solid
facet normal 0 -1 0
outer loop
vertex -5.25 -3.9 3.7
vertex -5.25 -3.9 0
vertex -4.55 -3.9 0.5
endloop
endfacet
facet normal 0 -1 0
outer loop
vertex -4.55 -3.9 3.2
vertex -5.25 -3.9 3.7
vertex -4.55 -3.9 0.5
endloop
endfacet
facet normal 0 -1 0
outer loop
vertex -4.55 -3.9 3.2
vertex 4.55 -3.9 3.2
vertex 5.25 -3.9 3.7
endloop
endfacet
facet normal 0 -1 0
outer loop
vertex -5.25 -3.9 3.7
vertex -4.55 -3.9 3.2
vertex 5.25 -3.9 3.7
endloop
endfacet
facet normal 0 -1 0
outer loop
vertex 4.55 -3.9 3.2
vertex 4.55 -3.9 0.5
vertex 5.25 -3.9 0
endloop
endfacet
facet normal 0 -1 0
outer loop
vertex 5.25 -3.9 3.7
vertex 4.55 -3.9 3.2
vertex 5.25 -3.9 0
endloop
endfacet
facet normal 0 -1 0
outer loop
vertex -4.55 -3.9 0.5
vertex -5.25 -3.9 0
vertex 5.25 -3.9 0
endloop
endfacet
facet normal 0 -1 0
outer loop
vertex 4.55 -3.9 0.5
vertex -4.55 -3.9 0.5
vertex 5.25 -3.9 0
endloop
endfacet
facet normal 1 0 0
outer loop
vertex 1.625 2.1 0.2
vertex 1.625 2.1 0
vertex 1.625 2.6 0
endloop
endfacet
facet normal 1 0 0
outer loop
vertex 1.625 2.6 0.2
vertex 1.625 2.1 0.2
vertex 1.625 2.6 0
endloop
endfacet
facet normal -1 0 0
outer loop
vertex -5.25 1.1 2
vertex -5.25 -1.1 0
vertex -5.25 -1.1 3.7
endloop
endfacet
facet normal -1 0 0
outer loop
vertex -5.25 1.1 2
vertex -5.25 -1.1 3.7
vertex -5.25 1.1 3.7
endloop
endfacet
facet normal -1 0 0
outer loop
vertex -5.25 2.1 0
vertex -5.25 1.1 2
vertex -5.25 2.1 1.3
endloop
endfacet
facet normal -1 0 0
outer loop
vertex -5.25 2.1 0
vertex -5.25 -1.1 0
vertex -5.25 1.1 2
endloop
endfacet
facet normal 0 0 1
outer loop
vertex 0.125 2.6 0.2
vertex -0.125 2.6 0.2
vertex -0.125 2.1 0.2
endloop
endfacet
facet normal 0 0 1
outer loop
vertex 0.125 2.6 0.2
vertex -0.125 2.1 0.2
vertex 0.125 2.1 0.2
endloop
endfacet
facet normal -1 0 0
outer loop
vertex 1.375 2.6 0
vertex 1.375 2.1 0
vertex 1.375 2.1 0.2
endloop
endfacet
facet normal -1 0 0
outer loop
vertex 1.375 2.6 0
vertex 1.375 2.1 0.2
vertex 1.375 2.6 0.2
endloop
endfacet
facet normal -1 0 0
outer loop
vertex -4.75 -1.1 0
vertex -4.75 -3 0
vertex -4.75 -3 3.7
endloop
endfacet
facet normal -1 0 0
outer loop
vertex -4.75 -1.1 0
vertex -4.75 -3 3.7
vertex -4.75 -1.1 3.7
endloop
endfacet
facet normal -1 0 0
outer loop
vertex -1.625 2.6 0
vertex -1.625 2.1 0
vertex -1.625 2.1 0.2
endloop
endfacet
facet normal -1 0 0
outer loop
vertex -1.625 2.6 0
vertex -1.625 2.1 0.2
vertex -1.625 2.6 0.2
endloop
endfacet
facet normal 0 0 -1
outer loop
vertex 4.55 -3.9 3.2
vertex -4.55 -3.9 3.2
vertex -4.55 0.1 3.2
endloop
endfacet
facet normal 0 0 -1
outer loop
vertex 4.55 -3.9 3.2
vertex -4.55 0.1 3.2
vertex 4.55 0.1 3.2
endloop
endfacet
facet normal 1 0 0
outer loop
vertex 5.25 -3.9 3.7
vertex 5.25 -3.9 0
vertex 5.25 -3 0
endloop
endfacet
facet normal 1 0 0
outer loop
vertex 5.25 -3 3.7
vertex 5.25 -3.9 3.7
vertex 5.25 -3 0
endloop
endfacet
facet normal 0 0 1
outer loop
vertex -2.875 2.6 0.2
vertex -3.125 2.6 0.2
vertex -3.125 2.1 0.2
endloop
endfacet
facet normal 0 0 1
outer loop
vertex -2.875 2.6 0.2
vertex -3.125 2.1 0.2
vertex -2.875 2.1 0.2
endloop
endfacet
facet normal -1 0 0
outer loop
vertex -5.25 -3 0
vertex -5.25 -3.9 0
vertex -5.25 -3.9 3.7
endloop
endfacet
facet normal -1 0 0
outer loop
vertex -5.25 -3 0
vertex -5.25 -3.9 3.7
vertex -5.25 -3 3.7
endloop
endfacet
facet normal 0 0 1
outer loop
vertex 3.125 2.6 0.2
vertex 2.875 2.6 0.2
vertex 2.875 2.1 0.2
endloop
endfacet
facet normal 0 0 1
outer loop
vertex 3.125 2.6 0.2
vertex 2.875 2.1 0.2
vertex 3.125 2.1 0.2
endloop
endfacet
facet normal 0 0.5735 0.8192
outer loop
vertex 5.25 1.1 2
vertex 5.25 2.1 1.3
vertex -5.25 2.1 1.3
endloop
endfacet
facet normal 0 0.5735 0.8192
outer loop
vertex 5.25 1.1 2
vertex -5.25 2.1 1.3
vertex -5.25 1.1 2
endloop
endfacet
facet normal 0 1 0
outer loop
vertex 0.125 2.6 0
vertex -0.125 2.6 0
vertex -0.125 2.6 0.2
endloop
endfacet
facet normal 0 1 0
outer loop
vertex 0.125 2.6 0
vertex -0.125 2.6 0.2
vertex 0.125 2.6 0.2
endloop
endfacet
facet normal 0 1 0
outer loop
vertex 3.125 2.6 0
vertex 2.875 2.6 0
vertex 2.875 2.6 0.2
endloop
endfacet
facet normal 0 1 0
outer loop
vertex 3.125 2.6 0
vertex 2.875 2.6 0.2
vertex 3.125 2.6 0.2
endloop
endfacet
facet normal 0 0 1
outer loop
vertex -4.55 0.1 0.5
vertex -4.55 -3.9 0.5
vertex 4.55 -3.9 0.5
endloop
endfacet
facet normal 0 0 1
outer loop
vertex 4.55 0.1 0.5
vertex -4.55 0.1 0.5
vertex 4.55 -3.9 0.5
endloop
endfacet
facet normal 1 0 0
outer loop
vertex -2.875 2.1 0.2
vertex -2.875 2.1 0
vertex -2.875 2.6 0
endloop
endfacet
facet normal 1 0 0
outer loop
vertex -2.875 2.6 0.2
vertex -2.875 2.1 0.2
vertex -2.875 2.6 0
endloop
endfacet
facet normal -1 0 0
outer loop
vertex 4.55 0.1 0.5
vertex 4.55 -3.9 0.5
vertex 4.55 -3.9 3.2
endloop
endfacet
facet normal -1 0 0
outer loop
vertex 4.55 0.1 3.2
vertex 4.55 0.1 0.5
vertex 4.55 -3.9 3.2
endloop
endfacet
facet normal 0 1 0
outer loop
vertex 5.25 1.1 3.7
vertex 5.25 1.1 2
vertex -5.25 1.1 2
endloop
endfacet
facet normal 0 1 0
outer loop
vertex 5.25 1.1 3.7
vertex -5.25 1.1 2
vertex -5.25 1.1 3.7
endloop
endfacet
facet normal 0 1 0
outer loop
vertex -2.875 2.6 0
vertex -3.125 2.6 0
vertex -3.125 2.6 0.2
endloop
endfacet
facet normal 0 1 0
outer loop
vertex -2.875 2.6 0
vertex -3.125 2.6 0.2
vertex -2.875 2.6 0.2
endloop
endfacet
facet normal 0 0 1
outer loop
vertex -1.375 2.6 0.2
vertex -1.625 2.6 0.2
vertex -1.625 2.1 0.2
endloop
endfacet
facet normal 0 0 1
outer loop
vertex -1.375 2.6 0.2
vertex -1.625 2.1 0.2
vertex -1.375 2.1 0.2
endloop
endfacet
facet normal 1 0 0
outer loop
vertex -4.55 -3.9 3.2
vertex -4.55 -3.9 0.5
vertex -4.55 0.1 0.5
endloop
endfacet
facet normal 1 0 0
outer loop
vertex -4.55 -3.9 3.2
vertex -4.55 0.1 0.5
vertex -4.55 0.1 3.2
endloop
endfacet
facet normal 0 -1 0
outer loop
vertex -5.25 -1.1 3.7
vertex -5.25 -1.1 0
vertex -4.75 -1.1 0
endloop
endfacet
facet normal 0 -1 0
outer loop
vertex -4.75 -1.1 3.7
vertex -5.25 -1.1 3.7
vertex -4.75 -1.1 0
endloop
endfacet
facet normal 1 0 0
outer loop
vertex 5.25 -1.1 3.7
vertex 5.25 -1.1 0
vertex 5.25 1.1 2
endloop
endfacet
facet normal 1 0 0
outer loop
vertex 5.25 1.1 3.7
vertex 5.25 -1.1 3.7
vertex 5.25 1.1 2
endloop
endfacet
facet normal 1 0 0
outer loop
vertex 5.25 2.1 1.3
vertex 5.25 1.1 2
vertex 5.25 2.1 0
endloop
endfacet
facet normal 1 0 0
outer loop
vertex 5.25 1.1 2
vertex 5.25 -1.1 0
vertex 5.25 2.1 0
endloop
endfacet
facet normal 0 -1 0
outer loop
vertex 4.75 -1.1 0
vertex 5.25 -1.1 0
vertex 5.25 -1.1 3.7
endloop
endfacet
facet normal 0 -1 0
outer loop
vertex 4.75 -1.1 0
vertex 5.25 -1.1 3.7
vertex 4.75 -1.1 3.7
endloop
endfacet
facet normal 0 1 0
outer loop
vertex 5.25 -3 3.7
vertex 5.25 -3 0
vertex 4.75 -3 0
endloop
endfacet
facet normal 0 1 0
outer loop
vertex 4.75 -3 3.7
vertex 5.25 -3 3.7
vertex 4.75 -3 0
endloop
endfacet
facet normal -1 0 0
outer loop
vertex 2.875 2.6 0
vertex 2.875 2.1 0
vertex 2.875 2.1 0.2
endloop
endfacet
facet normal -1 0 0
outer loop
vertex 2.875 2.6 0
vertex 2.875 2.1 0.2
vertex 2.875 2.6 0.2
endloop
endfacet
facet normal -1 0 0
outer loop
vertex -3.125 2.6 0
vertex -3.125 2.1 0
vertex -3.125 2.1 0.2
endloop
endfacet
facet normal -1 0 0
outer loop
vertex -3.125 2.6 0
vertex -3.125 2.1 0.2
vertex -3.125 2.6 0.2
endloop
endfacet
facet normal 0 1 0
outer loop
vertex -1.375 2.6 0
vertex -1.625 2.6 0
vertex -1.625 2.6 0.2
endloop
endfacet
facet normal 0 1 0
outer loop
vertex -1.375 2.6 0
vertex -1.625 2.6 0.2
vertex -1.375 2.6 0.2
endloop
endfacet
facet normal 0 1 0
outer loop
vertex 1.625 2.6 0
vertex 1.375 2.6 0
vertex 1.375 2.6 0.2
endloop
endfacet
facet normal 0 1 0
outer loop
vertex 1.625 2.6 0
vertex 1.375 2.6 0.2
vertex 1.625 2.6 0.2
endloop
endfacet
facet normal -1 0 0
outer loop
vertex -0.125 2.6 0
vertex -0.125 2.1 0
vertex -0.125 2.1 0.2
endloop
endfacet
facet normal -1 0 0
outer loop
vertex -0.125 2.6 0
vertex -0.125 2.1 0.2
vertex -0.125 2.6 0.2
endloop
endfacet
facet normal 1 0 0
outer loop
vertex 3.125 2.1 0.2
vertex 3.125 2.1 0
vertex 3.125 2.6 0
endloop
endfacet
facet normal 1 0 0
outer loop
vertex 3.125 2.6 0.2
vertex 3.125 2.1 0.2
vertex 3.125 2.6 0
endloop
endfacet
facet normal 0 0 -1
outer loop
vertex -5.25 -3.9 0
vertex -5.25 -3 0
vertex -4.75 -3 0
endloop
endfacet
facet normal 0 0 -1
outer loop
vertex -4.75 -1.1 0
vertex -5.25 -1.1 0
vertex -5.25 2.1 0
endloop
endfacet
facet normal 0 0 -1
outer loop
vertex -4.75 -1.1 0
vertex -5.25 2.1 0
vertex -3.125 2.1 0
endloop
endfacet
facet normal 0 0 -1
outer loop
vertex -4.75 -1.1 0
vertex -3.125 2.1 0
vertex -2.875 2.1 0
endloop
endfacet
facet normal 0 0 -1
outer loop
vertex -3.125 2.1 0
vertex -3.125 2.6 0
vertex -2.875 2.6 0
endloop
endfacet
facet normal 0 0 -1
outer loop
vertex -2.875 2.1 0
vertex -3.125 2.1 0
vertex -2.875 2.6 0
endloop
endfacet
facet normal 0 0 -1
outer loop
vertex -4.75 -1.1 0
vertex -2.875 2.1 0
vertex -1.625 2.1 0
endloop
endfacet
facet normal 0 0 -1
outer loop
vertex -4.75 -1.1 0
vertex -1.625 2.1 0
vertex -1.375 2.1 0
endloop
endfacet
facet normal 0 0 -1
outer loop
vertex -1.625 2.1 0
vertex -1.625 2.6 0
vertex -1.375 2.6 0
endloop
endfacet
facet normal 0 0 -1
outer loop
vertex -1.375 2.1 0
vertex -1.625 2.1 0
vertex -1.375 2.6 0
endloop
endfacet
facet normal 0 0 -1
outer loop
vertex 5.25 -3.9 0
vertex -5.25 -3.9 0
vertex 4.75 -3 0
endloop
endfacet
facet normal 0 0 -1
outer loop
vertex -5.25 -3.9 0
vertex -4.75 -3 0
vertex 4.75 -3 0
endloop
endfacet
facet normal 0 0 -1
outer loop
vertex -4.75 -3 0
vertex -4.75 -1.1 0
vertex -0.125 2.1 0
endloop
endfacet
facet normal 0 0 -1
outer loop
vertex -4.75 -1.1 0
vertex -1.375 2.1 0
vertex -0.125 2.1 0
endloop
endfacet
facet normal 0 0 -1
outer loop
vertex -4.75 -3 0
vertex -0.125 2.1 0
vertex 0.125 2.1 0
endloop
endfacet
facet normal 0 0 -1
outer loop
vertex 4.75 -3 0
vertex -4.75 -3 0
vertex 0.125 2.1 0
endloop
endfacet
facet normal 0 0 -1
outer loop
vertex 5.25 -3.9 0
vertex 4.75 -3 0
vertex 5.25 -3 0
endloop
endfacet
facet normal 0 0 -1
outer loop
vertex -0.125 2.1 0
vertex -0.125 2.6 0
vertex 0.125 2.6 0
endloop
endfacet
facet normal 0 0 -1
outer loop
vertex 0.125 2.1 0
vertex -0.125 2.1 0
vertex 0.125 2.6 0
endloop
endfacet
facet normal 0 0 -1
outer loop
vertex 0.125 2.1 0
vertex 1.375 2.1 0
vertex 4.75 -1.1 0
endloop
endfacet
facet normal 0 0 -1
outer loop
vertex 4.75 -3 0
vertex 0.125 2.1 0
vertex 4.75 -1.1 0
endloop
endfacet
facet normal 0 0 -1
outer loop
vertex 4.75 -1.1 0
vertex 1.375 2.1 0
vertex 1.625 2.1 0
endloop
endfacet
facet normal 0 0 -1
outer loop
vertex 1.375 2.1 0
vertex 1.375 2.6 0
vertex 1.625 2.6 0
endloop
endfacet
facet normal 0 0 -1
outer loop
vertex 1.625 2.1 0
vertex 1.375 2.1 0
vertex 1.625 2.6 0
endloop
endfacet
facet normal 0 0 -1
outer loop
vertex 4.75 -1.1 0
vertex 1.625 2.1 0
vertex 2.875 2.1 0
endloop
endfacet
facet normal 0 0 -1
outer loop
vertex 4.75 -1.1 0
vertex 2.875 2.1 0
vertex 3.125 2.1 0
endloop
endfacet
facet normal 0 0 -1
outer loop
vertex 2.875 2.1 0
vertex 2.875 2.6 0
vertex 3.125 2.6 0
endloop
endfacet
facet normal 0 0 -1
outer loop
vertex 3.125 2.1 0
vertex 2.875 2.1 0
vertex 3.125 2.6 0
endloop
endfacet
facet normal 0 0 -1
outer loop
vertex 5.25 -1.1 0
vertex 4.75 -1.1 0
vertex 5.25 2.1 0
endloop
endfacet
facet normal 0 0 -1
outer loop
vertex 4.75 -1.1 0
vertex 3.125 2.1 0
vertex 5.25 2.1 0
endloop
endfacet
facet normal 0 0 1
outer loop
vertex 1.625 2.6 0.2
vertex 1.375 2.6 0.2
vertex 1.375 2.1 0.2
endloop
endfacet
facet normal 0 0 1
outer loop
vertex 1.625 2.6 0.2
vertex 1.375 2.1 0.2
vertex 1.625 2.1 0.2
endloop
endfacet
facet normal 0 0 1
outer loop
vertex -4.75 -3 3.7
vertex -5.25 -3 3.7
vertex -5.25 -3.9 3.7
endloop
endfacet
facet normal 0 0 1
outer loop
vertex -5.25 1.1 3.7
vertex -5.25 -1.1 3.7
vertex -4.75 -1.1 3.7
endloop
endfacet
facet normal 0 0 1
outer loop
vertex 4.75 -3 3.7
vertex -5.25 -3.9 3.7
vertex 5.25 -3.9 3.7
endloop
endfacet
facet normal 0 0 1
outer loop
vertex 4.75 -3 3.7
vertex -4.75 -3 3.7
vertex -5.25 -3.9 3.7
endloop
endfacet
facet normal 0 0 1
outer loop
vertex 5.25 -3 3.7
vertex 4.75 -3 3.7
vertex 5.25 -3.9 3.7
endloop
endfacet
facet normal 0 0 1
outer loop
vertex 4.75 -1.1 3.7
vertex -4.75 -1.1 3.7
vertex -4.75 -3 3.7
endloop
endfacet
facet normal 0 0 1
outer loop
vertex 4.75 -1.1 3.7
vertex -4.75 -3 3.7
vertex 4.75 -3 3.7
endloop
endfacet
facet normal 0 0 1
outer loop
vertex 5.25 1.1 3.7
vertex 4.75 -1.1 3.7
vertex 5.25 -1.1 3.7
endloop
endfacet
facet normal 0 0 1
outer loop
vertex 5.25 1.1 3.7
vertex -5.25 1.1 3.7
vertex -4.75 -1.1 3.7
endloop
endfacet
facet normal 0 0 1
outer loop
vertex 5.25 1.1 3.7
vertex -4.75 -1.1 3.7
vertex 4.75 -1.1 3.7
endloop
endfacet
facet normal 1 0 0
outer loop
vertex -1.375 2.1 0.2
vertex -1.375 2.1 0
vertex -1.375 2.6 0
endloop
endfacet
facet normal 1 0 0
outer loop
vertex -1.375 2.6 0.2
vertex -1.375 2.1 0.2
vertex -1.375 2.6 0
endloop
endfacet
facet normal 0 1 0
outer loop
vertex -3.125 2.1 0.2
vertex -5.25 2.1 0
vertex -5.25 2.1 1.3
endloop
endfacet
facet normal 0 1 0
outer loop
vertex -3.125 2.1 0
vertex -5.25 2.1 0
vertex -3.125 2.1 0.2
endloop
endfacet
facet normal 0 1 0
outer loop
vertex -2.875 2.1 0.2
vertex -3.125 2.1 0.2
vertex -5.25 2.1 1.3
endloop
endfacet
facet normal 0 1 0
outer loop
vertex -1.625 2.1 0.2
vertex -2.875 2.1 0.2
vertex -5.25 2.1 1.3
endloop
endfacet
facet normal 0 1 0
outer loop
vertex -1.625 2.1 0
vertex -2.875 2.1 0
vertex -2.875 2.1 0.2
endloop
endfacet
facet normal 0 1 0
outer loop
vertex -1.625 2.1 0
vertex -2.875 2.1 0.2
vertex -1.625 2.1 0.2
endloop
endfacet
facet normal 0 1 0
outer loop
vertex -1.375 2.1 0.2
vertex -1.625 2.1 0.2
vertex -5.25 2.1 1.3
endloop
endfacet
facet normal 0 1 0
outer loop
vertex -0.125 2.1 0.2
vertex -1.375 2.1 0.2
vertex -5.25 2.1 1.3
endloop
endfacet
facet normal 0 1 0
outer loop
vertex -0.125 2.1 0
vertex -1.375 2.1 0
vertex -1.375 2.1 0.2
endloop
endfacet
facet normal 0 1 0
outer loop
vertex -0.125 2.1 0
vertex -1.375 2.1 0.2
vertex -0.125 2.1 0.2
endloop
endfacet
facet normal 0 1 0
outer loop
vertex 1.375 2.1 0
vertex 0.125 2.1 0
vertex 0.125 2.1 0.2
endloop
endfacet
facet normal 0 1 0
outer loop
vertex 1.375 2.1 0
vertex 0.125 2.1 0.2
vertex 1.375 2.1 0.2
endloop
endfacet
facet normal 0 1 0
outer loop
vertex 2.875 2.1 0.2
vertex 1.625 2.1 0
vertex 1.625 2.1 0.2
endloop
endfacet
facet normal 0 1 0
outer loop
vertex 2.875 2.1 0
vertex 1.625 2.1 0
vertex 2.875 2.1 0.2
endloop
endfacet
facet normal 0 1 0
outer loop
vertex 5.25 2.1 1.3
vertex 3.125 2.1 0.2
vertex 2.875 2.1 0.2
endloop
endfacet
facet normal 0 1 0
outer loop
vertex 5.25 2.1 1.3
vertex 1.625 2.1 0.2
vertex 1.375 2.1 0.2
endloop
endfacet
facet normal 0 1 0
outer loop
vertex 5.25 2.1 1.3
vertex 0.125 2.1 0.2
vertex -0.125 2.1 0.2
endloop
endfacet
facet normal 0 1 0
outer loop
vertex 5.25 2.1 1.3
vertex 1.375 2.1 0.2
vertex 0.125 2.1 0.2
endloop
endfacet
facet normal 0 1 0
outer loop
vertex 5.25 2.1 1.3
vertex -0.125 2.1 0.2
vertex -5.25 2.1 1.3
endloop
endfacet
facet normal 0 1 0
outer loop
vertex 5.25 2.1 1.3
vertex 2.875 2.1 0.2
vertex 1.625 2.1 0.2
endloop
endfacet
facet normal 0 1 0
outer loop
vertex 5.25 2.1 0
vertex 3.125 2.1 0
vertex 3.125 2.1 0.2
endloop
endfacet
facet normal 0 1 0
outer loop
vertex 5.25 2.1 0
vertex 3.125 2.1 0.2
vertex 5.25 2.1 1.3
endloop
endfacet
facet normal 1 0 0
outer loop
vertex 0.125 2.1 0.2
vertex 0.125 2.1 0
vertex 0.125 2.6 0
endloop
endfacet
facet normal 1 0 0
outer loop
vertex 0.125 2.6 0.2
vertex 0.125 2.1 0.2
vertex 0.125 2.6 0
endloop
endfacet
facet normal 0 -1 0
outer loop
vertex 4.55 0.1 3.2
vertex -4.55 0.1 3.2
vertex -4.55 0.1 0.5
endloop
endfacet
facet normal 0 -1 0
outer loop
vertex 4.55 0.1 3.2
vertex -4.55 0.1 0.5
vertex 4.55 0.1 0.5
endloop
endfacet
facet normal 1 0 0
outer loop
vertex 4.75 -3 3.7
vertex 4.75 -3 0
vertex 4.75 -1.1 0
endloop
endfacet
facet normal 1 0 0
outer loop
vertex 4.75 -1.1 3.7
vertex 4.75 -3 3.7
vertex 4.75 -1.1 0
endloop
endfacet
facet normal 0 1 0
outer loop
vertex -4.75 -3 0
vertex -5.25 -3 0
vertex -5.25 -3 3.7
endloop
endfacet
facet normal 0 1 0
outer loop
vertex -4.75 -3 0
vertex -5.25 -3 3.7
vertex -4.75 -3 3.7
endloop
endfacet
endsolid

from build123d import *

# Parameters (mm, degrees)
SKETCH_W            = 10.5
SKETCH_H            = 6
PAD_DEPTH           = 3.7
SKETCH001_W         = 0.25
SKETCH001_H         = 0.5
PAD001_DEPTH        = 0.2
LINEARPATTERN_COUNT = 5
LINEARPATTERN_PITCH = 1.5
POCKET_DEPTH        = 5.251
POCKET_DEPTH_BACK   = -5.251
SKETCH003_W         = 0.5
SKETCH003_H         = 1.9
POCKET001_DEPTH     = 29.48394
SKETCH004_W         = 9.1
SKETCH004_H         = 2.7
POCKET002_DEPTH     = 4


with BuildPart() as part:
    # Sketch → Pad (new body)
    with BuildSketch(Plane.XY):
        with Locations((0, -0.9)):
            Rectangle(SKETCH_W, SKETCH_H)
    extrude(amount=PAD_DEPTH)

    # Sketch001 → Pad001 (join)
    with BuildSketch(Plane.XY):
        with Locations((-3, 2.35)):
            Rectangle(SKETCH001_W, SKETCH001_H)
    pad001 = extrude(amount=PAD001_DEPTH)

    # LinearPattern: Pad001 ×5
    with Locations(*[(i * LINEARPATTERN_PITCH, 0, 0) for i in range(1, LINEARPATTERN_COUNT)]):
        add(pad001)

    # Sketch002 → Pocket (cut, two sides)
    with BuildSketch(Plane.YZ) as pocket_sk:
        Polygon((1.1, 3.7), (2.1, 3.7), (2.1, 1.3), (1.1, 2), align=None)
    extrude(amount=-POCKET_DEPTH, mode=Mode.SUBTRACT)
    extrude(pocket_sk.sketch, amount=-POCKET_DEPTH_BACK, mode=Mode.SUBTRACT)

    # Sketch003 → Pocket001 (cut, through all)
    with BuildSketch(Plane.XY):
        with Locations((-5, -2.05)):
            Rectangle(SKETCH003_W, SKETCH003_H)
    pocket001 = extrude(amount=POCKET001_DEPTH, mode=Mode.SUBTRACT)

    # Mirrored: Pocket001 across YZ
    add(pocket001.mirror(Plane.YZ), mode=Mode.SUBTRACT)

    # Sketch004 (on Face18 of Mirrored) → Pocket002 (cut)
    with BuildSketch(Plane.XZ.offset(3.9)):
        with Locations((0, 1.85)):
            Rectangle(SKETCH004_W, SKETCH004_H)
    extrude(amount=-POCKET002_DEPTH, mode=Mode.SUBTRACT)


solid = part.part
